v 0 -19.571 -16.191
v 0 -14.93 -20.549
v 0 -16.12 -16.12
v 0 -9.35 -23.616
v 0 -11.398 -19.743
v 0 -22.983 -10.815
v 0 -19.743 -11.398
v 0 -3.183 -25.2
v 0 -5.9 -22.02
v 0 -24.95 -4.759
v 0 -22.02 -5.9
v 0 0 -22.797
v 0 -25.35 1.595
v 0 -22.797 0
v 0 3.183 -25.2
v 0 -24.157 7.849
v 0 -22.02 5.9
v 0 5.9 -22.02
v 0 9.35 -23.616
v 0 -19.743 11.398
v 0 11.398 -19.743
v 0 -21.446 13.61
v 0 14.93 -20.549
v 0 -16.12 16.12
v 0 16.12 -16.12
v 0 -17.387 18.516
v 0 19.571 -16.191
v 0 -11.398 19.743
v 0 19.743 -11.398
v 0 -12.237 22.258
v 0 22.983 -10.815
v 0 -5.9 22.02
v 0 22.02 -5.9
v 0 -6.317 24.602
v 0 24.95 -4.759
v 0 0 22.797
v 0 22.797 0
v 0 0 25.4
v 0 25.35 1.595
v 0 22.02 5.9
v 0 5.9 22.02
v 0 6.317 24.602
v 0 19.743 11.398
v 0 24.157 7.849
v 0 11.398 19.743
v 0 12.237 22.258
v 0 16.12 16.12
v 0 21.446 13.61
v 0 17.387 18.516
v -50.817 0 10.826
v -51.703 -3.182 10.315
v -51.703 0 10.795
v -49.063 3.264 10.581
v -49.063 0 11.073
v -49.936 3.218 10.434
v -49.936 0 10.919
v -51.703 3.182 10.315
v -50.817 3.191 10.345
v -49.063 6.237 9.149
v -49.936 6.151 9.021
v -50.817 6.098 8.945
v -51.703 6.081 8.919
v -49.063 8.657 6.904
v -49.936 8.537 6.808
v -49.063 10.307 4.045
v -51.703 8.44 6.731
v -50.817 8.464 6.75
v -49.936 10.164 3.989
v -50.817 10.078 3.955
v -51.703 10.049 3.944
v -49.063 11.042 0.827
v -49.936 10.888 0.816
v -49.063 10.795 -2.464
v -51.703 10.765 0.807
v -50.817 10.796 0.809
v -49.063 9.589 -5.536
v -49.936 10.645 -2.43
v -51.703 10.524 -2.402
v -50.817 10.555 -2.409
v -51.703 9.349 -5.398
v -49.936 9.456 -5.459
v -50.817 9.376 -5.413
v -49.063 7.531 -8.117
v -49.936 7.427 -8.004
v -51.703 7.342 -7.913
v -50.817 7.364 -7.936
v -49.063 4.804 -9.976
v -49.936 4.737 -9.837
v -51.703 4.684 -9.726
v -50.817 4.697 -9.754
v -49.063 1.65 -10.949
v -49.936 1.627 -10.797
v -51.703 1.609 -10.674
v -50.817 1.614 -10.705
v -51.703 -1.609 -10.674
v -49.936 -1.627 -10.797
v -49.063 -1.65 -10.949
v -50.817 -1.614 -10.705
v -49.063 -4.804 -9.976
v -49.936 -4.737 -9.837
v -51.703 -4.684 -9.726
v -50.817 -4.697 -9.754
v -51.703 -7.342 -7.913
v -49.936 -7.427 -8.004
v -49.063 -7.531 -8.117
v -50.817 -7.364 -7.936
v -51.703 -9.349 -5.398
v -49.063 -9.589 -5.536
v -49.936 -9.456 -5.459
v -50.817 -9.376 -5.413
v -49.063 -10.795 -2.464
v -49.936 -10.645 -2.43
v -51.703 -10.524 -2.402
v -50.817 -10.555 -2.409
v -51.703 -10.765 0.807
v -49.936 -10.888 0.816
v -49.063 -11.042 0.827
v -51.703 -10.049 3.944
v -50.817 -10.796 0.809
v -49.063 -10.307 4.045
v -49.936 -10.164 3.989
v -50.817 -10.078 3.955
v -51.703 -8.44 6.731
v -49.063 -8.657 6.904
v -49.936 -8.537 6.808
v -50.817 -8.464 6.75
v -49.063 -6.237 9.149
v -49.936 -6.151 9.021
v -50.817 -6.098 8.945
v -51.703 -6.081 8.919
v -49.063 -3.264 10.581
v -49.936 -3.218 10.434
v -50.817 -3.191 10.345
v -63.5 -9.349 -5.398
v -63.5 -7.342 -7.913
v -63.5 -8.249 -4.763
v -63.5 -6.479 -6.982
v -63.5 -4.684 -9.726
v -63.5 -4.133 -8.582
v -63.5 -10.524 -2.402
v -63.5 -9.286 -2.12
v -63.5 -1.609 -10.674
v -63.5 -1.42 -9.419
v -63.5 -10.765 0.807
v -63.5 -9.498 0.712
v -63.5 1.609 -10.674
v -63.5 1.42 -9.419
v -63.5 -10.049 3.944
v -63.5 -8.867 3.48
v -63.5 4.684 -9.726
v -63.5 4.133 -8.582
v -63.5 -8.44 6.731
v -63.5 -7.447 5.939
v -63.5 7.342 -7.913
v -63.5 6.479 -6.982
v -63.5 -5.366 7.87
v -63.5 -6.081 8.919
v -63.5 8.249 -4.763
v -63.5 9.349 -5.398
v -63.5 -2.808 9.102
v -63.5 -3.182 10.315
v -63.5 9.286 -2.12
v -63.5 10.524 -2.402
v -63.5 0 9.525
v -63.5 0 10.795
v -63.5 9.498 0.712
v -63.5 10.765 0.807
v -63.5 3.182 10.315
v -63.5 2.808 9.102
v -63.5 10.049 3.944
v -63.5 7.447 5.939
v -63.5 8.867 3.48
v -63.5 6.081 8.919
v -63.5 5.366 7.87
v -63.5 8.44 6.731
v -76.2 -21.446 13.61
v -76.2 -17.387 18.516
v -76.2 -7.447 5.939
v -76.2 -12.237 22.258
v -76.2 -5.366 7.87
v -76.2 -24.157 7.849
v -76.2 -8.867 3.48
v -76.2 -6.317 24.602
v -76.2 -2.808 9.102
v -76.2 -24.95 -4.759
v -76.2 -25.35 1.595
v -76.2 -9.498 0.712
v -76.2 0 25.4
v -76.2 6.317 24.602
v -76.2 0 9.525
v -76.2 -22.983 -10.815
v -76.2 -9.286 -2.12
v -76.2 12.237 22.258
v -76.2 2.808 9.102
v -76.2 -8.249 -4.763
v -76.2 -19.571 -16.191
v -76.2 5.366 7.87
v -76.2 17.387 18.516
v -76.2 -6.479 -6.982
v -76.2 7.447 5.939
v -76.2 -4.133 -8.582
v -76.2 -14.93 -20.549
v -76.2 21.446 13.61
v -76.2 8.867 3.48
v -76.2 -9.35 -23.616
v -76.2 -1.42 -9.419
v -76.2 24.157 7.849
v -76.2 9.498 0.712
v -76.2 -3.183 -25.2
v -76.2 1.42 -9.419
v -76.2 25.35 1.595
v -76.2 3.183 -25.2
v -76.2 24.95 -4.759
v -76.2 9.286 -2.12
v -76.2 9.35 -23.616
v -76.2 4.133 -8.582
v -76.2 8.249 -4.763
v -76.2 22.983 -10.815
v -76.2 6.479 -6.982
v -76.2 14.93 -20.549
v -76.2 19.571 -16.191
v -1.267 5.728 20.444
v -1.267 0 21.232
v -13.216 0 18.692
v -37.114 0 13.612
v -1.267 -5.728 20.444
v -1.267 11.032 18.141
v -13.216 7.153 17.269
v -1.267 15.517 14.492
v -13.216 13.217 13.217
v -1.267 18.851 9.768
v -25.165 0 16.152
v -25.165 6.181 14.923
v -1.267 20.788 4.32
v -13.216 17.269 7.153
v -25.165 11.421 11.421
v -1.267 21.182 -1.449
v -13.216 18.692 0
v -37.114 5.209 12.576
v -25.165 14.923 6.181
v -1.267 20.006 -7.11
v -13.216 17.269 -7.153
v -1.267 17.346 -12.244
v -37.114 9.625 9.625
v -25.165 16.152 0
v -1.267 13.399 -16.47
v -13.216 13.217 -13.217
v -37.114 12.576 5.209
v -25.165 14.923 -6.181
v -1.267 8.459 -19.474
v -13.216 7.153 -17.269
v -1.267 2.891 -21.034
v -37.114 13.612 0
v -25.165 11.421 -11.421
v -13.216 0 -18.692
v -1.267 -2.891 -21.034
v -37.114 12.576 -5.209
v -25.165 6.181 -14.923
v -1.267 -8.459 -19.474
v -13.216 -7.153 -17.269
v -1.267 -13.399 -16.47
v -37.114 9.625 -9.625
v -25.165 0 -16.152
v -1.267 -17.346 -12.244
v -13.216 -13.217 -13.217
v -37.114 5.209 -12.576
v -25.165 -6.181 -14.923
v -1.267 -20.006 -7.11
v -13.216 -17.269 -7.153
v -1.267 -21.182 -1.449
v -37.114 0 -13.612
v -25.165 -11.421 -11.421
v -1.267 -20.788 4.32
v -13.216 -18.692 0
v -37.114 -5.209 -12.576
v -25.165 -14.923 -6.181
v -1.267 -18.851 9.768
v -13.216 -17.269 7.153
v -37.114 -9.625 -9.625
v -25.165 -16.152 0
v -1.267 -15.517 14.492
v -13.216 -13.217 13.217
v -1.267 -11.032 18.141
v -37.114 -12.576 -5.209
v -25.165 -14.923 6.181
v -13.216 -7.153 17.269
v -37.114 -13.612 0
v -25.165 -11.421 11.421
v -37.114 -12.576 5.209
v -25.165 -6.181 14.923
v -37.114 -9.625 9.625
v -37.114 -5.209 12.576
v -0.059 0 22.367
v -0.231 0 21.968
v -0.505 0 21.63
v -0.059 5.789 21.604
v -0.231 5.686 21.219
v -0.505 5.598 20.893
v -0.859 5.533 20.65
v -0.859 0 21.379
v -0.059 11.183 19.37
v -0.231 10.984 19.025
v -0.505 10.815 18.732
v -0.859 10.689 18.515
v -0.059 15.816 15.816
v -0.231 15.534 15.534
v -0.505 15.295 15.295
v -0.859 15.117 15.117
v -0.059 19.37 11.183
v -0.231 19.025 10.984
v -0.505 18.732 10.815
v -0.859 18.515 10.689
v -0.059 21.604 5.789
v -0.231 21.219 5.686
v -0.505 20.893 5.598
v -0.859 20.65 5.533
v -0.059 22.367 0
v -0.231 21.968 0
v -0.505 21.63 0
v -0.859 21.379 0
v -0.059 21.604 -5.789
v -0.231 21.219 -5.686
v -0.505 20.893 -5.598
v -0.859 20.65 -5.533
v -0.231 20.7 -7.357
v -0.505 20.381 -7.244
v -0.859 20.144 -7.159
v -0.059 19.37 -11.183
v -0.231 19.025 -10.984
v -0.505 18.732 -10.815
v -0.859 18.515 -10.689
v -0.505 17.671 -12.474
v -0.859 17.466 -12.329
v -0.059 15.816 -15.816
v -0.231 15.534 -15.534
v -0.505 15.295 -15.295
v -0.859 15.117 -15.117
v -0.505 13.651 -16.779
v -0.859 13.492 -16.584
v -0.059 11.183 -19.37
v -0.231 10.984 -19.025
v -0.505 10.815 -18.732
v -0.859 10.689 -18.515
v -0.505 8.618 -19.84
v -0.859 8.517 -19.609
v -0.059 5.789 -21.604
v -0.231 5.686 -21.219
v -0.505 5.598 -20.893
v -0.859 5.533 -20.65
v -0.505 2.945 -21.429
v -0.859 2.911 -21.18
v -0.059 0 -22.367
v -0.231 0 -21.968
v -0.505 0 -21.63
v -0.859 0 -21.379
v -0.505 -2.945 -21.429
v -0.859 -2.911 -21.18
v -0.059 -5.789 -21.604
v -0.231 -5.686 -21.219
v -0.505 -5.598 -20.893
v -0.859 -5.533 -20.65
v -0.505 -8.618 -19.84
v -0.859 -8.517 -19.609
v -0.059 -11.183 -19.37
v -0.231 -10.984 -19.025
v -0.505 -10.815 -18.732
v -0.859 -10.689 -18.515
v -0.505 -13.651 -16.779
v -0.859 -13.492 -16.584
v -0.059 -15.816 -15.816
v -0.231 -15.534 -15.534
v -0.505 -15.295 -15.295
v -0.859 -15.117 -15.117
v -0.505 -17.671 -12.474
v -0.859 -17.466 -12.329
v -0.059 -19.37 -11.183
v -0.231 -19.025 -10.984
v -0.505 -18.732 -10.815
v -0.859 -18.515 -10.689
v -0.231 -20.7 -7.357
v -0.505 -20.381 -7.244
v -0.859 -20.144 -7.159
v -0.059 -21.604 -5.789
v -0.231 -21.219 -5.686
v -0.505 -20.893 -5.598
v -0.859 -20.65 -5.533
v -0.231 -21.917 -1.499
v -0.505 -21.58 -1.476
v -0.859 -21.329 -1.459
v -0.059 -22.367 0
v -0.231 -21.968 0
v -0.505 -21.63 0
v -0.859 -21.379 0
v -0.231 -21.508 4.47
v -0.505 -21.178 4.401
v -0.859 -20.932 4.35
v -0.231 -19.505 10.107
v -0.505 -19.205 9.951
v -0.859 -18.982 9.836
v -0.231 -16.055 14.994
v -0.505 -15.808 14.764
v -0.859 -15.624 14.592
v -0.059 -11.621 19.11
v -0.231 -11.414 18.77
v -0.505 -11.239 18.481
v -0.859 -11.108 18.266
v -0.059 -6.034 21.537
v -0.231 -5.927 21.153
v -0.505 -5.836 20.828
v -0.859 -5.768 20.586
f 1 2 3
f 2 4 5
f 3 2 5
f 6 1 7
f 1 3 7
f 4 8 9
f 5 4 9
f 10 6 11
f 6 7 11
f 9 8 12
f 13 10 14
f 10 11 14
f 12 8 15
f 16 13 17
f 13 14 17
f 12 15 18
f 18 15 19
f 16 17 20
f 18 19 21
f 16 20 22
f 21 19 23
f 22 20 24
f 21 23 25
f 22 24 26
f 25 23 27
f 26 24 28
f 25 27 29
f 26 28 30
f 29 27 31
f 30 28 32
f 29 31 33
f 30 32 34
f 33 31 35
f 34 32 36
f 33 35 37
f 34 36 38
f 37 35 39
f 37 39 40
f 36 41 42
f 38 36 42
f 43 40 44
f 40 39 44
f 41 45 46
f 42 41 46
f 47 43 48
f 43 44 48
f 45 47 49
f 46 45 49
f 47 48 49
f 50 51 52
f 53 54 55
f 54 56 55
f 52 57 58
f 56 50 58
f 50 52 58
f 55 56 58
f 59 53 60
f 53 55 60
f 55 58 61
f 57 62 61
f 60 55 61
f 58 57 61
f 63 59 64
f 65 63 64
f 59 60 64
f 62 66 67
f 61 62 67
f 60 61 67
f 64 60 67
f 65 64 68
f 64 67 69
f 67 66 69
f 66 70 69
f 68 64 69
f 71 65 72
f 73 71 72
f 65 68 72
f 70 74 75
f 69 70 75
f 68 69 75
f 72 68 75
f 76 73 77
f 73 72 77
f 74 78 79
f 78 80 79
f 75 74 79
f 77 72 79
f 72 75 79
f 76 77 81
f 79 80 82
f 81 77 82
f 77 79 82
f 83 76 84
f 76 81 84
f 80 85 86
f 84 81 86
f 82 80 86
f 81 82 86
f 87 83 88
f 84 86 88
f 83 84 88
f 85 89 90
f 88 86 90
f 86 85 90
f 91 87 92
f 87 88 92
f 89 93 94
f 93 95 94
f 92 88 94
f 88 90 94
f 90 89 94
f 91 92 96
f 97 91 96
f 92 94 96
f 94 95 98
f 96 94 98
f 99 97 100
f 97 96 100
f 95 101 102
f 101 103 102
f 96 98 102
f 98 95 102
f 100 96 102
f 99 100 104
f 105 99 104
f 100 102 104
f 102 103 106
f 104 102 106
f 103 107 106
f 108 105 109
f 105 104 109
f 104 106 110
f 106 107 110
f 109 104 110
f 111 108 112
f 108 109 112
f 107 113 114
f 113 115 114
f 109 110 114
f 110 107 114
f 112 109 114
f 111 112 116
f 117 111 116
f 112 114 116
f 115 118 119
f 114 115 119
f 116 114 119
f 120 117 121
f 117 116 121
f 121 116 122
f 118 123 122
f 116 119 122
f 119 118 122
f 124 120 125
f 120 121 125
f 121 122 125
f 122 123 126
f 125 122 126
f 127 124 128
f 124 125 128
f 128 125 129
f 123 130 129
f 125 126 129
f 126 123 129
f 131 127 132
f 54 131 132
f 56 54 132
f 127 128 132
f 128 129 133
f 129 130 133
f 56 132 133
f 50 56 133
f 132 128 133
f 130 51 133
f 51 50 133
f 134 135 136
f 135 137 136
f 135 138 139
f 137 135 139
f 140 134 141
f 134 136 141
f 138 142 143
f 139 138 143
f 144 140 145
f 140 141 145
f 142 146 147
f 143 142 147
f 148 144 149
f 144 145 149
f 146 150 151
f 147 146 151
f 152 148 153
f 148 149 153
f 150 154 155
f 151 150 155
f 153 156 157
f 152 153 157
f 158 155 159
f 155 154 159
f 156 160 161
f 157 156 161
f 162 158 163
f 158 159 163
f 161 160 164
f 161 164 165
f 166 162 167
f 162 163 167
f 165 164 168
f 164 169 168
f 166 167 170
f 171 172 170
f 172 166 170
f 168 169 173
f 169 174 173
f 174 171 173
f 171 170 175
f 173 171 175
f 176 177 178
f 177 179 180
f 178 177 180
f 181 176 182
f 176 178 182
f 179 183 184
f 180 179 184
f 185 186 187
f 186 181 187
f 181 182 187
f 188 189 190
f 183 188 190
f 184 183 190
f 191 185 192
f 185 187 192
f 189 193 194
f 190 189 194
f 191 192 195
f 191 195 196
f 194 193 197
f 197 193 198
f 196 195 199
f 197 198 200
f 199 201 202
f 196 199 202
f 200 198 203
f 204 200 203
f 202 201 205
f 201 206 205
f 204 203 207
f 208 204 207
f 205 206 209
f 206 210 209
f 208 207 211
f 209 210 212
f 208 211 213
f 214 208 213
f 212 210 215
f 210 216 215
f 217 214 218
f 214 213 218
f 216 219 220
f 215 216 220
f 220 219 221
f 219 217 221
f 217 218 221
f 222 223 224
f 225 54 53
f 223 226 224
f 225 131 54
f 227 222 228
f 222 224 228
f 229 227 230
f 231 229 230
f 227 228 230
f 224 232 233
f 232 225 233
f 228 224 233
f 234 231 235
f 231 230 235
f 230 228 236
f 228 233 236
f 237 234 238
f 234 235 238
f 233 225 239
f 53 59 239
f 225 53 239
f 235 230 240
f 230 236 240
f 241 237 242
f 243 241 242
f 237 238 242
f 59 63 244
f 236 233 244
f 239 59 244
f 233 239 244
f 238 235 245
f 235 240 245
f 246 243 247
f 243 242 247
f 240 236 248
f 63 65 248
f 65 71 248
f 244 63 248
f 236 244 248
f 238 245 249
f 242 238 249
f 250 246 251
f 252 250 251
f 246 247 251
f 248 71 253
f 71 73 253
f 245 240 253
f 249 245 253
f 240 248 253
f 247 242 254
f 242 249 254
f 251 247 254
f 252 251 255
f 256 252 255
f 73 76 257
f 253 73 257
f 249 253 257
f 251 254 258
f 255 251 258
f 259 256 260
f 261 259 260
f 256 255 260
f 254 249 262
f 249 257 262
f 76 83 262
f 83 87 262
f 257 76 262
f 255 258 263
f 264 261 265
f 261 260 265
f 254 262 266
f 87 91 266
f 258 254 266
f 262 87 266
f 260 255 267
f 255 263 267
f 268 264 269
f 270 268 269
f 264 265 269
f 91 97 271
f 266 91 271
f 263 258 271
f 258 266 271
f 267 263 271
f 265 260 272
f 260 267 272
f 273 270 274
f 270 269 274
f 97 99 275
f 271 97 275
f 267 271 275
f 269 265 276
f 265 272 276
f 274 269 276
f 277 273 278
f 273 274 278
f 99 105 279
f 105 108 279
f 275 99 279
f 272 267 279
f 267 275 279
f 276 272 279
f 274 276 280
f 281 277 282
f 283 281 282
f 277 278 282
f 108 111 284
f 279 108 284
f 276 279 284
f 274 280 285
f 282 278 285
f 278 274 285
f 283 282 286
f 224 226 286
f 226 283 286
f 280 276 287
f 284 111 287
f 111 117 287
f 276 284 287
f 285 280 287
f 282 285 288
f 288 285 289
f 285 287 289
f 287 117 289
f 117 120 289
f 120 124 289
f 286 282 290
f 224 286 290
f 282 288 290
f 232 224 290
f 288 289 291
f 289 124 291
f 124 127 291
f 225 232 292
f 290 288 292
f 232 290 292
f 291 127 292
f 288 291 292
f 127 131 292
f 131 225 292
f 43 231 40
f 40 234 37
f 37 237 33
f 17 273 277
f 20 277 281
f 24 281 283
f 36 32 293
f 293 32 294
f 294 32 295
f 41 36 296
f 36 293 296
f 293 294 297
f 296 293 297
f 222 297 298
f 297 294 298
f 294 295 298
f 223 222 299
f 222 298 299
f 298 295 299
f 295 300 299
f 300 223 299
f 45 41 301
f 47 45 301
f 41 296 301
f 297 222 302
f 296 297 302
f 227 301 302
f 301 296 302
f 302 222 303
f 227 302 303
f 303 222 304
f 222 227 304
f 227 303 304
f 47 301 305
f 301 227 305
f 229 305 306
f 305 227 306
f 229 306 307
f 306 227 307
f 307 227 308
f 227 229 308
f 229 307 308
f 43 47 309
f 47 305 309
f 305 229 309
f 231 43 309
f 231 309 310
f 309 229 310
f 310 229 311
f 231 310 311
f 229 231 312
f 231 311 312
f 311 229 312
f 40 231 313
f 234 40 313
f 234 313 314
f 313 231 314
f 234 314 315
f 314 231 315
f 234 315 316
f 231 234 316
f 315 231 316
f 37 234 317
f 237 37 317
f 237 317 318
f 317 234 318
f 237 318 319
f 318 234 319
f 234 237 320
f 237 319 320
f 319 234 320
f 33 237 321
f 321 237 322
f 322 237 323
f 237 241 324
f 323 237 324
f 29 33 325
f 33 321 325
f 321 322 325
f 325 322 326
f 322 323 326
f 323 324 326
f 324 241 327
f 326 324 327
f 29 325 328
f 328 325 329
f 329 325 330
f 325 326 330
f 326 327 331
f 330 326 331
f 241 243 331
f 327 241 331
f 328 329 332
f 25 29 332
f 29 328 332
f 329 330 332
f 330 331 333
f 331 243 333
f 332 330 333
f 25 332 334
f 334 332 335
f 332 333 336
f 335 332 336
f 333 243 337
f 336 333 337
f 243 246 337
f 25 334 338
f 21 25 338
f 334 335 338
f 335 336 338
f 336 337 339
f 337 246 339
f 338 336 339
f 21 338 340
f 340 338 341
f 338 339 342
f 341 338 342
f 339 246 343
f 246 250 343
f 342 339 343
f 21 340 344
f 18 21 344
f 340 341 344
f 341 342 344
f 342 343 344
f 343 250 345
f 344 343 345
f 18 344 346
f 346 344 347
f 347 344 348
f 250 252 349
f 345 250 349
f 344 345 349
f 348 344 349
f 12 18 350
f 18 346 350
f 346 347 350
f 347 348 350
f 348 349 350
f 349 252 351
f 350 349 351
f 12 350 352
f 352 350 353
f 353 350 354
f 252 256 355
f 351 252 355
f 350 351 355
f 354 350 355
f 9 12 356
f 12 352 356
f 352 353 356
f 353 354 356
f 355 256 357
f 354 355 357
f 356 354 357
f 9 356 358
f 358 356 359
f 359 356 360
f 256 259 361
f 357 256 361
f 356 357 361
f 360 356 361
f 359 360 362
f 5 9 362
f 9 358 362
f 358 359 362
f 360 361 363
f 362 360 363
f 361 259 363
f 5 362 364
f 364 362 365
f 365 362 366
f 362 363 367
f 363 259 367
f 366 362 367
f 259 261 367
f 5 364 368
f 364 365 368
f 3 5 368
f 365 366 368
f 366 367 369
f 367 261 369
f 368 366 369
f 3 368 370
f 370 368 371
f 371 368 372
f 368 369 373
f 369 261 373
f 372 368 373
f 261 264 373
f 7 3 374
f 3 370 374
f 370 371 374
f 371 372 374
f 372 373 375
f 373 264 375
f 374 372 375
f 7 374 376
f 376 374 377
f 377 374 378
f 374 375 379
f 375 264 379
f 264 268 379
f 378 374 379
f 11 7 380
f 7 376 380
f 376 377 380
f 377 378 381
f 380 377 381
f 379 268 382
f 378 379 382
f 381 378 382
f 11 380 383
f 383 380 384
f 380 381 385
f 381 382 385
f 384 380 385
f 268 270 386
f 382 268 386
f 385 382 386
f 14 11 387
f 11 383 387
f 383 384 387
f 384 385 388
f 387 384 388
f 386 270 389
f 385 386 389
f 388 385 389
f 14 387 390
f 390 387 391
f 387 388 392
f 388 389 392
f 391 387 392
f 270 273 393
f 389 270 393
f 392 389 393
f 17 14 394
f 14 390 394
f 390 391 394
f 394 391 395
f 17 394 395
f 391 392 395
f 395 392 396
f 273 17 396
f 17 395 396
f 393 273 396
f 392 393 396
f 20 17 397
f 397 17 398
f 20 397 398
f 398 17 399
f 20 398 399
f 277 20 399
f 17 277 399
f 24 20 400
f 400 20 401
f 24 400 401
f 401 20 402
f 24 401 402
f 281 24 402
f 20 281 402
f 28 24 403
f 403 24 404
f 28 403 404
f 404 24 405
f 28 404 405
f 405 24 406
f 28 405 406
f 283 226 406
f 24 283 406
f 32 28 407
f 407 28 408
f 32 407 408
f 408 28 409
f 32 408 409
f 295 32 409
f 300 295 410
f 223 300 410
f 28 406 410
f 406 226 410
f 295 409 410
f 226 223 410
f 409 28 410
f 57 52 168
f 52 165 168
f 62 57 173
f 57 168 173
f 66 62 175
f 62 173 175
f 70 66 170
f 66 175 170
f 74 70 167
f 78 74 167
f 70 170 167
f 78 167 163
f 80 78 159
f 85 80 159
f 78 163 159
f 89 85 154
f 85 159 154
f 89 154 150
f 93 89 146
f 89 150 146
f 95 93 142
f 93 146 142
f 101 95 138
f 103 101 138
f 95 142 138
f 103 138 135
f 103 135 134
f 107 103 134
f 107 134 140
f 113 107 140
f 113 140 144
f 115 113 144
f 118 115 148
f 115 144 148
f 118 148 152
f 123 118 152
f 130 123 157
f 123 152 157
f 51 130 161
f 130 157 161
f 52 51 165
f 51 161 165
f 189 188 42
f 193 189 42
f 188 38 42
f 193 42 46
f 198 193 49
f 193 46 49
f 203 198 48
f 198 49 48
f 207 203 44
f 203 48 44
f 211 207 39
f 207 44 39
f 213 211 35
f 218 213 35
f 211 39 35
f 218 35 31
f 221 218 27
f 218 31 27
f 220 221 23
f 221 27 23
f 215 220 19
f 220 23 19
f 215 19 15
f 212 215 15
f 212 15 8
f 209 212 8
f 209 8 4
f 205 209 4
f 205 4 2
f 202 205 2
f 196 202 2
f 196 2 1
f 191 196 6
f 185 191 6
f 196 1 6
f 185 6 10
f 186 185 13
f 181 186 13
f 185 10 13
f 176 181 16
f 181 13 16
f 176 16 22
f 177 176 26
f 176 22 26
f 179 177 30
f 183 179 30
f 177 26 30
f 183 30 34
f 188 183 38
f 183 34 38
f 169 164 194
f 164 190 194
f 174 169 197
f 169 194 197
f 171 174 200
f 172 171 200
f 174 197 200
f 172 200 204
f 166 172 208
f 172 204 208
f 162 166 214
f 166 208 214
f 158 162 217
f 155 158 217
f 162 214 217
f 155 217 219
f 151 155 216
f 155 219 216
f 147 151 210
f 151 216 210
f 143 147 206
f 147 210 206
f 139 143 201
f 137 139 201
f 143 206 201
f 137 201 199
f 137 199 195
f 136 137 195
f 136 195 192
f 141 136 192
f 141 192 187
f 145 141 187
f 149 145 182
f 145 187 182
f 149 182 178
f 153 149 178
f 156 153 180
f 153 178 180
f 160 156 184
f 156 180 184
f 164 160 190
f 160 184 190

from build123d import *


with BuildPart() as part:
    # Sketch1 → Revolve1 (revolve)
    with BuildSketch(Plane(origin=(0, 0, 0), x_dir=(1, 0, 0), z_dir=(0, 1, 0))):
        with BuildLine():
            Line((-1.267499712, -21.231676029), (-49.062545314, -11.072525471))
            ThreePointArc((-49.062545314, -11.072525471), (-50.375512304, -10.864571929), (-51.703023788, -10.795))
            Line((-51.703023788, -10.795), (-63.5, -10.795))
            Line((-63.5, -10.795), (-63.5, -9.525))
            Line((-63.5, -9.525), (-76.2, -9.525))
            Line((-76.2, -9.525), (-76.2, -25.4))
            Line((-76.2, -25.4), (0, -25.4))
            Line((0, -25.4), (0, -22.796907819))
            ThreePointArc((0, -22.796907819), (-0.356611032, -21.78986933), (-1.267499712, -21.231676029))
        make_face()
    revolve(axis=Axis((3.175, 0, 0), (-1, 0, 0)))


solid = part.part
